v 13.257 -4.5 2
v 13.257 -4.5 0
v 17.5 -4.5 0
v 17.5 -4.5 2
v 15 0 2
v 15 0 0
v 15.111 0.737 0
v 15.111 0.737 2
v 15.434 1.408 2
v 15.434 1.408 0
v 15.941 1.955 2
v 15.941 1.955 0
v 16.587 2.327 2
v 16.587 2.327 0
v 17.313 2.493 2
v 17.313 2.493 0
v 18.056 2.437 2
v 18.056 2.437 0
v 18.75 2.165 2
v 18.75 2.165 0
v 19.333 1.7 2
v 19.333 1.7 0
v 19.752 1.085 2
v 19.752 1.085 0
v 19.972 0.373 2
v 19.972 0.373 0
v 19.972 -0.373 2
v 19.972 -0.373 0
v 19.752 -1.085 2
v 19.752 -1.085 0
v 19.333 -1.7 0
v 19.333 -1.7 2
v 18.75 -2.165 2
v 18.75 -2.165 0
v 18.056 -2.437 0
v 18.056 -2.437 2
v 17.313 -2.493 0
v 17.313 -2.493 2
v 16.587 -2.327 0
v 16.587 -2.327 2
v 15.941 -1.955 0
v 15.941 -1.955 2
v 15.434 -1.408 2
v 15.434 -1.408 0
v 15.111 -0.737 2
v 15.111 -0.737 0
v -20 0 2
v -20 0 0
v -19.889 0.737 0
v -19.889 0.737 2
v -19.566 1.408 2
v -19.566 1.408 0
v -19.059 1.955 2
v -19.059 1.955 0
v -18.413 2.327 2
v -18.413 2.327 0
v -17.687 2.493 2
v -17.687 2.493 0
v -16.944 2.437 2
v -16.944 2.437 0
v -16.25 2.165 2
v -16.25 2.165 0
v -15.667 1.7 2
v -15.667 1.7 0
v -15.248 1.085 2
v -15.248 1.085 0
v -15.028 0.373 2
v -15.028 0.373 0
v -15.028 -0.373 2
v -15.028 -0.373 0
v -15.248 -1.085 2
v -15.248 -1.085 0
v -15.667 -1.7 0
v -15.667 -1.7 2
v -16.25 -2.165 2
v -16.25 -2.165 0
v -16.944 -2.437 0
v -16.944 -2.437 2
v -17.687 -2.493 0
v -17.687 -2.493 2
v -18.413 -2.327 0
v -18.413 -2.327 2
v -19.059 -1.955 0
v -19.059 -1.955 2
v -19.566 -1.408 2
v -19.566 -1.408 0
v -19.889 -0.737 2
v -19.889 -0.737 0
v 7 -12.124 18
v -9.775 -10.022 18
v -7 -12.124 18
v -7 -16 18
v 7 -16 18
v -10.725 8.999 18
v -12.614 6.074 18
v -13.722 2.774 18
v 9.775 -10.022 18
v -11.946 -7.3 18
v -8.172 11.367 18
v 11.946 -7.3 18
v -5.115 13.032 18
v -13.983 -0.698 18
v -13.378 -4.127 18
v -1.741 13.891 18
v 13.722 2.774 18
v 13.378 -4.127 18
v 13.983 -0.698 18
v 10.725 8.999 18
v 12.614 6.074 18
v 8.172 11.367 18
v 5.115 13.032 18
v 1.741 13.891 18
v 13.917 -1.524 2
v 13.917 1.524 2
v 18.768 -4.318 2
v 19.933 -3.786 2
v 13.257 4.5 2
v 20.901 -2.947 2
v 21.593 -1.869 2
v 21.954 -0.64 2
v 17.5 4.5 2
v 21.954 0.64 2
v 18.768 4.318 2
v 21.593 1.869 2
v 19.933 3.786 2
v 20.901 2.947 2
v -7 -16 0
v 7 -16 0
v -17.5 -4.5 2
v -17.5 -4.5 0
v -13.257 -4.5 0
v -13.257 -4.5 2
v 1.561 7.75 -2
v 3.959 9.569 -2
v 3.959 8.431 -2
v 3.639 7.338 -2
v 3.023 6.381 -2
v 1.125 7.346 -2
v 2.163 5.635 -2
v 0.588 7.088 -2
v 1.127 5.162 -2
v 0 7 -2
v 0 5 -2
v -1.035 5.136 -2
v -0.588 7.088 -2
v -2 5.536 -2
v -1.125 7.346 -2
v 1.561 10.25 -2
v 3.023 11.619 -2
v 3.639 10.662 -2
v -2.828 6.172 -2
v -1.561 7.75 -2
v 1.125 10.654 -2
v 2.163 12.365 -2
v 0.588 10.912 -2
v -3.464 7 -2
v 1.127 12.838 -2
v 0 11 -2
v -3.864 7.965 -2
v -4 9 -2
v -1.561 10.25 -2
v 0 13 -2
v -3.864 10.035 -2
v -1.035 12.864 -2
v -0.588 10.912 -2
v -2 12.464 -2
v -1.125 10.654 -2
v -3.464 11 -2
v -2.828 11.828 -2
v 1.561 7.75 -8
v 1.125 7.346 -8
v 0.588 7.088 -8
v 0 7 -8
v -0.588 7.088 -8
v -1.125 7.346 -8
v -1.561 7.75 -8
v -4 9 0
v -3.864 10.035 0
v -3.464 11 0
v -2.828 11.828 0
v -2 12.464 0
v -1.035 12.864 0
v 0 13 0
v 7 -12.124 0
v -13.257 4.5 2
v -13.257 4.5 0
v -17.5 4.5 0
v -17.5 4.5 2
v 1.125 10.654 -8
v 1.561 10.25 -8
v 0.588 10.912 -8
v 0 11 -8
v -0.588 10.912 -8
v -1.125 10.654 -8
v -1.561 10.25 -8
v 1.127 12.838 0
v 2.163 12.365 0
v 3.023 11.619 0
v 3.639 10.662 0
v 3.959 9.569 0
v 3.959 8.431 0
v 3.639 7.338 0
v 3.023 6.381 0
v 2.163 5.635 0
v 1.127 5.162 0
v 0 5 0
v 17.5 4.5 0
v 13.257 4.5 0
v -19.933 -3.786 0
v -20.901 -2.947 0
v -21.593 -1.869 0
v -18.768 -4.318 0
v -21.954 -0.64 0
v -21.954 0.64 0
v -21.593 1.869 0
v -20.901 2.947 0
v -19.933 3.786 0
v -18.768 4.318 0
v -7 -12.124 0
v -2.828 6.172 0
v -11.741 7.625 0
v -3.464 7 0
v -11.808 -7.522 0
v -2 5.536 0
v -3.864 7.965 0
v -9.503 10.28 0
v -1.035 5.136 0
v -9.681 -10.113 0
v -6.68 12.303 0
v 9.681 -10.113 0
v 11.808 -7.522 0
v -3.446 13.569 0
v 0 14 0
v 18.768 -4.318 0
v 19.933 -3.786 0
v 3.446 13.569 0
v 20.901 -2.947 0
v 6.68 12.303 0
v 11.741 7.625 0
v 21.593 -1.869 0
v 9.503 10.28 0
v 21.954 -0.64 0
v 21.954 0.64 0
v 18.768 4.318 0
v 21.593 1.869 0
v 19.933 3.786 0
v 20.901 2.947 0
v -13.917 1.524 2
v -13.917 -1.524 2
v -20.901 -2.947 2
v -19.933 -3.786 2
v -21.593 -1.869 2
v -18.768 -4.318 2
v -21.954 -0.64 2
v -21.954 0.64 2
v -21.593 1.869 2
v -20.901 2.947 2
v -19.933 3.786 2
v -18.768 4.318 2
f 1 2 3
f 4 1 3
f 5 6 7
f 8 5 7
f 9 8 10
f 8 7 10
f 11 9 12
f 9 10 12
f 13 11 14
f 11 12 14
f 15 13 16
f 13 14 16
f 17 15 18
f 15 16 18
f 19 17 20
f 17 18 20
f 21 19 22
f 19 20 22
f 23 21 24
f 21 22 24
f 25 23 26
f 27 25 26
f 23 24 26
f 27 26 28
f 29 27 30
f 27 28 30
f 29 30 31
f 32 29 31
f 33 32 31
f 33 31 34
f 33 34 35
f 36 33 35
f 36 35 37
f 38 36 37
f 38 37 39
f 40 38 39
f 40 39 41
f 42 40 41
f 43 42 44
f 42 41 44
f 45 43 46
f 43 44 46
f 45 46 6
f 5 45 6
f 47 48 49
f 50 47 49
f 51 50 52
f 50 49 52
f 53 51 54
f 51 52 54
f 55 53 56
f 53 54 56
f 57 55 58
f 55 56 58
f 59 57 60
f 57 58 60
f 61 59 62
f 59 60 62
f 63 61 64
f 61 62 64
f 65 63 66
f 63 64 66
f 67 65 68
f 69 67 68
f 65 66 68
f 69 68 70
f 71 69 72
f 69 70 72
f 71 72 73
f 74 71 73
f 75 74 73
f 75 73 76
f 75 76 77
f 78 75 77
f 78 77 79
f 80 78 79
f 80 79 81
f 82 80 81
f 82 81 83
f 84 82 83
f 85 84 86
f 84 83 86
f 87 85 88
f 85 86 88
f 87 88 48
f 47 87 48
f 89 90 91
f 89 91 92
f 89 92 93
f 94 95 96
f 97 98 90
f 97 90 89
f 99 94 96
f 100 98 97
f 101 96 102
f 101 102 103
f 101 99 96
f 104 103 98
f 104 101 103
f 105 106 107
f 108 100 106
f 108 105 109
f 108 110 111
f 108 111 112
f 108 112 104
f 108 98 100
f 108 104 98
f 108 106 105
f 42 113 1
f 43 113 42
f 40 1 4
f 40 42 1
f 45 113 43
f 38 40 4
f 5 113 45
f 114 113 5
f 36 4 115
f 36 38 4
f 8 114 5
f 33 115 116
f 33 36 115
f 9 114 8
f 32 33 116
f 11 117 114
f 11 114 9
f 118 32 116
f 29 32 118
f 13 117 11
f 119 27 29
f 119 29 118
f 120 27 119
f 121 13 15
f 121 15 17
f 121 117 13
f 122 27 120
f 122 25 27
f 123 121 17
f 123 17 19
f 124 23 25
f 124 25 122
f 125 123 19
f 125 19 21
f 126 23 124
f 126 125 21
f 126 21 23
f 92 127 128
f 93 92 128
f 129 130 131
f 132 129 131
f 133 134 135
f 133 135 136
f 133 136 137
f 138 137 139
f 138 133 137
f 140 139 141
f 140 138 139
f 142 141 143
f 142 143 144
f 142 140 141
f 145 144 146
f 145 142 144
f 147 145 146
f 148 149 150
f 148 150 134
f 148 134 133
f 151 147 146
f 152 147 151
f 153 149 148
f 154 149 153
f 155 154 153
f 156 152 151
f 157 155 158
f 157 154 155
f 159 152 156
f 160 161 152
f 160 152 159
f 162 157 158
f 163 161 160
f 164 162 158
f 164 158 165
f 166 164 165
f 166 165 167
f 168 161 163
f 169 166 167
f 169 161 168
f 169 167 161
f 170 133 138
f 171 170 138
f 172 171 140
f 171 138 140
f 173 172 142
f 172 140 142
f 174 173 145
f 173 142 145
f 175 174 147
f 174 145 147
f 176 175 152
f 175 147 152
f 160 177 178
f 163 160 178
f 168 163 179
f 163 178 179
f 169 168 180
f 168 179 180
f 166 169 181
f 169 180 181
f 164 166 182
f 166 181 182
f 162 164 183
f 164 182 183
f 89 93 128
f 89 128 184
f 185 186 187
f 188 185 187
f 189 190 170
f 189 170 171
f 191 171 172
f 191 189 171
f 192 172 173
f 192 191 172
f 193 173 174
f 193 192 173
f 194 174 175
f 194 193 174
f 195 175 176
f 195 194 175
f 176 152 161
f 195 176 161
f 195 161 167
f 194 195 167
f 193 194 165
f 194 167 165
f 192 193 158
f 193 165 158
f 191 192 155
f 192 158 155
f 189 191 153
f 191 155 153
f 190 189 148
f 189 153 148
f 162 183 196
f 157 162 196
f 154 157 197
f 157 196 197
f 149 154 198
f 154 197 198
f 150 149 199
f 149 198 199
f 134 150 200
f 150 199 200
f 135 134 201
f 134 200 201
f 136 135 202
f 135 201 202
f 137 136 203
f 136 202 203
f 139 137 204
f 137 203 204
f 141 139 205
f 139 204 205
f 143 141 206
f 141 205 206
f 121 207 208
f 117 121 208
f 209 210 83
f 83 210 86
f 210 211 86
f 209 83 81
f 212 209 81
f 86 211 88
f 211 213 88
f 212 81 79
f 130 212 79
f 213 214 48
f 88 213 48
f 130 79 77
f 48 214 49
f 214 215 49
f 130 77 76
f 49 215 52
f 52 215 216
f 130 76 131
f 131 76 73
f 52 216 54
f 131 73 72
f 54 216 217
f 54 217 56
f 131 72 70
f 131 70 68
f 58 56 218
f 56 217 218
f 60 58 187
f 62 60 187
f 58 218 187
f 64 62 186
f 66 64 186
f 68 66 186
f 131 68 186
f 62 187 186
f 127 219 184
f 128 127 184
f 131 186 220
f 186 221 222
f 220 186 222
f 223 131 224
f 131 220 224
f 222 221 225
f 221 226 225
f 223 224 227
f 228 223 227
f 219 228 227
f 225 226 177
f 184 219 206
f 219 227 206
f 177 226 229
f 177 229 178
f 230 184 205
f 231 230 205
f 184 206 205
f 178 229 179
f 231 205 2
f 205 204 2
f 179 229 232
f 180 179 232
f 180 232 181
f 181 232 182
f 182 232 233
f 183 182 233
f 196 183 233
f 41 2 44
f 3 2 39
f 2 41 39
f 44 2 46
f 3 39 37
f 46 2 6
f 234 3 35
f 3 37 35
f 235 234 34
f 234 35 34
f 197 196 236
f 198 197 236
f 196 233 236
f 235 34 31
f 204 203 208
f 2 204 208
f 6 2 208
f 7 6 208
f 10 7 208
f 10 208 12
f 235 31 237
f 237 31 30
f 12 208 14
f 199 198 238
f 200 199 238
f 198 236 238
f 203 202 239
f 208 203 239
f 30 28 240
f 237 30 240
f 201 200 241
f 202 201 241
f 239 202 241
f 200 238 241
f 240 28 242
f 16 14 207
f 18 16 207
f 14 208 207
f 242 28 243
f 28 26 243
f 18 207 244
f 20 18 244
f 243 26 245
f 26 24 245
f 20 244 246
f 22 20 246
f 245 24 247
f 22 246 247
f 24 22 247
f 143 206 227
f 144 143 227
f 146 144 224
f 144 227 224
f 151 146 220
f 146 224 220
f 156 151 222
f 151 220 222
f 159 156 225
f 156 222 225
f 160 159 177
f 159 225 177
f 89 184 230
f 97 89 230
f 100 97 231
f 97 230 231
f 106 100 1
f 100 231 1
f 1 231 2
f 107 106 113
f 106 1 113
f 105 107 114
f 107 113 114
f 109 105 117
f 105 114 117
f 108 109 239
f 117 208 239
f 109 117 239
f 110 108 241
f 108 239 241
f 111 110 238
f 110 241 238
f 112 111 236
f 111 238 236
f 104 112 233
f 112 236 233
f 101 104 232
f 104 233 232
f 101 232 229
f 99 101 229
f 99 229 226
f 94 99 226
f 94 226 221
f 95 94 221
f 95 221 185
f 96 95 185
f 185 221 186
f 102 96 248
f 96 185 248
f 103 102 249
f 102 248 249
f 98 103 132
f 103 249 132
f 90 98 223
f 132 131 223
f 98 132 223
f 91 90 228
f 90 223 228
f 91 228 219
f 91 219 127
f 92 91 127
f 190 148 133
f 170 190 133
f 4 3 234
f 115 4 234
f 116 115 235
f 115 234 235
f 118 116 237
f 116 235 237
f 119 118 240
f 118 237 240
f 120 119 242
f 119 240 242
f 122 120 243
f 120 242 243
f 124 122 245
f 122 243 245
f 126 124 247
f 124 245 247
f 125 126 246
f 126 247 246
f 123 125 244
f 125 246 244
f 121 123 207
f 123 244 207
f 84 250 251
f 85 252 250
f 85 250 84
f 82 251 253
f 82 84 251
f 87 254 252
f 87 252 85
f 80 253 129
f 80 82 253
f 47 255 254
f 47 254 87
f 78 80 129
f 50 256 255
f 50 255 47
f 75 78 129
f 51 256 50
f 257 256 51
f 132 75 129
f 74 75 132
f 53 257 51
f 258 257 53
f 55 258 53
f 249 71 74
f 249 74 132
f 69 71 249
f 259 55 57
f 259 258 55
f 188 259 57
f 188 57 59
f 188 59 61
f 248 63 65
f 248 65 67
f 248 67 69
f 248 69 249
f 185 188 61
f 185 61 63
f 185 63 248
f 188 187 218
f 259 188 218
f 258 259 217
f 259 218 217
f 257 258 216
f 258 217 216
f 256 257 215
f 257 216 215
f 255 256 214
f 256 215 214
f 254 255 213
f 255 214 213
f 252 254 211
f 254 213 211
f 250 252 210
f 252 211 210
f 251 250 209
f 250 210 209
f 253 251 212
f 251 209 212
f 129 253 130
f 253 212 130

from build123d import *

# Parameters (mm, degrees)
CROQUIS1_R              = 14
SALIENTE_EXTRUIR1_DEPTH = 18
CROQUIS2_R              = 2.5
SALIENTE_EXTRUIR3_DEPTH = 2
SALIENTE_EXTRUIR4_DEPTH = 2
SALIENTE_EXTRUIR5_DEPTH = 6


with BuildPart() as part:
    # Croquis1 → Saliente-Extruir1 (new body)
    with BuildSketch(Plane.XY):
        Circle(CROQUIS1_R)
        with BuildLine():
            ThreePointArc((7, -12.124355653), (3.623466631, -13.522961568), (0, -14))
            Line((0, -14), (0, -16))
            Line((0, -16), (7, -16))
            Line((7, -16), (7, -12.124355653))
        make_face()
        with BuildLine():
            Line((0, -16), (0, -14))
            ThreePointArc((0, -14), (-3.623466631, -13.522961568), (-7, -12.124355653))
            Line((-7, -12.124355653), (-7, -16))
            Line((-7, -16), (0, -16))
        make_face()
    extrude(amount=SALIENTE_EXTRUIR1_DEPTH)

    # Croquis2 → Saliente-Extruir3 (add)
    # profile 1 of 2: a face of its own
    with BuildSketch(Plane(origin=(0, 0, 0), x_dir=(-1, 0, 0), z_dir=(0, 0, -1))):
        with BuildLine():
            Line((-17.5, 4.5), (-13.257073584, 4.5))
            ThreePointArc((-13.257073584, 4.5), (-14, 0), (-13.257073584, -4.5))
            Line((-13.257073584, -4.5), (-17.5, -4.5))
            ThreePointArc((-17.5, -4.5), (-22, 0), (-17.5, 4.5))
        make_face()
        with Locations((-17.5, 0)):
            Circle(CROQUIS2_R, mode=Mode.SUBTRACT)
    # profile 2 of 2: a face of its own
    with BuildSketch(Plane(origin=(0, 0, 0), x_dir=(-1, 0, 0), z_dir=(0, 0, -1))):
        with BuildLine():
            Line((17.5, -4.5), (13.257073584, -4.5))
            ThreePointArc((13.257073584, -4.5), (14, 0), (13.257073584, 4.5))
            Line((13.257073584, 4.5), (17.5, 4.5))
            ThreePointArc((17.5, 4.5), (22, 0), (17.5, -4.5))
        make_face()
        with Locations((17.5, 0)):
            Circle(CROQUIS2_R, mode=Mode.SUBTRACT)
    extrude(amount=-SALIENTE_EXTRUIR3_DEPTH)

    # Croquis3 → Saliente-Extruir4 (add)
    with BuildSketch(Plane(origin=(0, 0, 0), x_dir=(-1, 0, 0), z_dir=(0, 0, -1))):
        with BuildLine():
            ThreePointArc((4, 9), (2.828427125, 11.828427125), (0, 13))
            Line((0, 13), (0, 5))
            ThreePointArc((0, 5), (2.828427125, 6.171572875), (4, 9))
        make_face()
        with BuildLine():
            Line((0, 5), (0, 13))
            ThreePointArc((0, 13), (-4, 9), (0, 5))
        make_face()
    extrude(amount=SALIENTE_EXTRUIR4_DEPTH)

    # Croquis4 → Saliente-Extruir5 (add)
    with BuildSketch(Plane(origin=(0, 0, -2), x_dir=(-1, 0, 0), z_dir=(0, 0, -1))):
        with BuildLine():
            ThreePointArc((1.5612495, 10.25), (0, 11), (-1.5612495, 10.25))
            Line((-1.5612495, 10.25), (-1.5612495, 7.75))
            ThreePointArc((-1.5612495, 7.75), (0, 7), (1.5612495, 7.75))
            Line((1.5612495, 7.75), (1.5612495, 10.25))
        make_face()
    extrude(amount=SALIENTE_EXTRUIR5_DEPTH)


solid = part.part
